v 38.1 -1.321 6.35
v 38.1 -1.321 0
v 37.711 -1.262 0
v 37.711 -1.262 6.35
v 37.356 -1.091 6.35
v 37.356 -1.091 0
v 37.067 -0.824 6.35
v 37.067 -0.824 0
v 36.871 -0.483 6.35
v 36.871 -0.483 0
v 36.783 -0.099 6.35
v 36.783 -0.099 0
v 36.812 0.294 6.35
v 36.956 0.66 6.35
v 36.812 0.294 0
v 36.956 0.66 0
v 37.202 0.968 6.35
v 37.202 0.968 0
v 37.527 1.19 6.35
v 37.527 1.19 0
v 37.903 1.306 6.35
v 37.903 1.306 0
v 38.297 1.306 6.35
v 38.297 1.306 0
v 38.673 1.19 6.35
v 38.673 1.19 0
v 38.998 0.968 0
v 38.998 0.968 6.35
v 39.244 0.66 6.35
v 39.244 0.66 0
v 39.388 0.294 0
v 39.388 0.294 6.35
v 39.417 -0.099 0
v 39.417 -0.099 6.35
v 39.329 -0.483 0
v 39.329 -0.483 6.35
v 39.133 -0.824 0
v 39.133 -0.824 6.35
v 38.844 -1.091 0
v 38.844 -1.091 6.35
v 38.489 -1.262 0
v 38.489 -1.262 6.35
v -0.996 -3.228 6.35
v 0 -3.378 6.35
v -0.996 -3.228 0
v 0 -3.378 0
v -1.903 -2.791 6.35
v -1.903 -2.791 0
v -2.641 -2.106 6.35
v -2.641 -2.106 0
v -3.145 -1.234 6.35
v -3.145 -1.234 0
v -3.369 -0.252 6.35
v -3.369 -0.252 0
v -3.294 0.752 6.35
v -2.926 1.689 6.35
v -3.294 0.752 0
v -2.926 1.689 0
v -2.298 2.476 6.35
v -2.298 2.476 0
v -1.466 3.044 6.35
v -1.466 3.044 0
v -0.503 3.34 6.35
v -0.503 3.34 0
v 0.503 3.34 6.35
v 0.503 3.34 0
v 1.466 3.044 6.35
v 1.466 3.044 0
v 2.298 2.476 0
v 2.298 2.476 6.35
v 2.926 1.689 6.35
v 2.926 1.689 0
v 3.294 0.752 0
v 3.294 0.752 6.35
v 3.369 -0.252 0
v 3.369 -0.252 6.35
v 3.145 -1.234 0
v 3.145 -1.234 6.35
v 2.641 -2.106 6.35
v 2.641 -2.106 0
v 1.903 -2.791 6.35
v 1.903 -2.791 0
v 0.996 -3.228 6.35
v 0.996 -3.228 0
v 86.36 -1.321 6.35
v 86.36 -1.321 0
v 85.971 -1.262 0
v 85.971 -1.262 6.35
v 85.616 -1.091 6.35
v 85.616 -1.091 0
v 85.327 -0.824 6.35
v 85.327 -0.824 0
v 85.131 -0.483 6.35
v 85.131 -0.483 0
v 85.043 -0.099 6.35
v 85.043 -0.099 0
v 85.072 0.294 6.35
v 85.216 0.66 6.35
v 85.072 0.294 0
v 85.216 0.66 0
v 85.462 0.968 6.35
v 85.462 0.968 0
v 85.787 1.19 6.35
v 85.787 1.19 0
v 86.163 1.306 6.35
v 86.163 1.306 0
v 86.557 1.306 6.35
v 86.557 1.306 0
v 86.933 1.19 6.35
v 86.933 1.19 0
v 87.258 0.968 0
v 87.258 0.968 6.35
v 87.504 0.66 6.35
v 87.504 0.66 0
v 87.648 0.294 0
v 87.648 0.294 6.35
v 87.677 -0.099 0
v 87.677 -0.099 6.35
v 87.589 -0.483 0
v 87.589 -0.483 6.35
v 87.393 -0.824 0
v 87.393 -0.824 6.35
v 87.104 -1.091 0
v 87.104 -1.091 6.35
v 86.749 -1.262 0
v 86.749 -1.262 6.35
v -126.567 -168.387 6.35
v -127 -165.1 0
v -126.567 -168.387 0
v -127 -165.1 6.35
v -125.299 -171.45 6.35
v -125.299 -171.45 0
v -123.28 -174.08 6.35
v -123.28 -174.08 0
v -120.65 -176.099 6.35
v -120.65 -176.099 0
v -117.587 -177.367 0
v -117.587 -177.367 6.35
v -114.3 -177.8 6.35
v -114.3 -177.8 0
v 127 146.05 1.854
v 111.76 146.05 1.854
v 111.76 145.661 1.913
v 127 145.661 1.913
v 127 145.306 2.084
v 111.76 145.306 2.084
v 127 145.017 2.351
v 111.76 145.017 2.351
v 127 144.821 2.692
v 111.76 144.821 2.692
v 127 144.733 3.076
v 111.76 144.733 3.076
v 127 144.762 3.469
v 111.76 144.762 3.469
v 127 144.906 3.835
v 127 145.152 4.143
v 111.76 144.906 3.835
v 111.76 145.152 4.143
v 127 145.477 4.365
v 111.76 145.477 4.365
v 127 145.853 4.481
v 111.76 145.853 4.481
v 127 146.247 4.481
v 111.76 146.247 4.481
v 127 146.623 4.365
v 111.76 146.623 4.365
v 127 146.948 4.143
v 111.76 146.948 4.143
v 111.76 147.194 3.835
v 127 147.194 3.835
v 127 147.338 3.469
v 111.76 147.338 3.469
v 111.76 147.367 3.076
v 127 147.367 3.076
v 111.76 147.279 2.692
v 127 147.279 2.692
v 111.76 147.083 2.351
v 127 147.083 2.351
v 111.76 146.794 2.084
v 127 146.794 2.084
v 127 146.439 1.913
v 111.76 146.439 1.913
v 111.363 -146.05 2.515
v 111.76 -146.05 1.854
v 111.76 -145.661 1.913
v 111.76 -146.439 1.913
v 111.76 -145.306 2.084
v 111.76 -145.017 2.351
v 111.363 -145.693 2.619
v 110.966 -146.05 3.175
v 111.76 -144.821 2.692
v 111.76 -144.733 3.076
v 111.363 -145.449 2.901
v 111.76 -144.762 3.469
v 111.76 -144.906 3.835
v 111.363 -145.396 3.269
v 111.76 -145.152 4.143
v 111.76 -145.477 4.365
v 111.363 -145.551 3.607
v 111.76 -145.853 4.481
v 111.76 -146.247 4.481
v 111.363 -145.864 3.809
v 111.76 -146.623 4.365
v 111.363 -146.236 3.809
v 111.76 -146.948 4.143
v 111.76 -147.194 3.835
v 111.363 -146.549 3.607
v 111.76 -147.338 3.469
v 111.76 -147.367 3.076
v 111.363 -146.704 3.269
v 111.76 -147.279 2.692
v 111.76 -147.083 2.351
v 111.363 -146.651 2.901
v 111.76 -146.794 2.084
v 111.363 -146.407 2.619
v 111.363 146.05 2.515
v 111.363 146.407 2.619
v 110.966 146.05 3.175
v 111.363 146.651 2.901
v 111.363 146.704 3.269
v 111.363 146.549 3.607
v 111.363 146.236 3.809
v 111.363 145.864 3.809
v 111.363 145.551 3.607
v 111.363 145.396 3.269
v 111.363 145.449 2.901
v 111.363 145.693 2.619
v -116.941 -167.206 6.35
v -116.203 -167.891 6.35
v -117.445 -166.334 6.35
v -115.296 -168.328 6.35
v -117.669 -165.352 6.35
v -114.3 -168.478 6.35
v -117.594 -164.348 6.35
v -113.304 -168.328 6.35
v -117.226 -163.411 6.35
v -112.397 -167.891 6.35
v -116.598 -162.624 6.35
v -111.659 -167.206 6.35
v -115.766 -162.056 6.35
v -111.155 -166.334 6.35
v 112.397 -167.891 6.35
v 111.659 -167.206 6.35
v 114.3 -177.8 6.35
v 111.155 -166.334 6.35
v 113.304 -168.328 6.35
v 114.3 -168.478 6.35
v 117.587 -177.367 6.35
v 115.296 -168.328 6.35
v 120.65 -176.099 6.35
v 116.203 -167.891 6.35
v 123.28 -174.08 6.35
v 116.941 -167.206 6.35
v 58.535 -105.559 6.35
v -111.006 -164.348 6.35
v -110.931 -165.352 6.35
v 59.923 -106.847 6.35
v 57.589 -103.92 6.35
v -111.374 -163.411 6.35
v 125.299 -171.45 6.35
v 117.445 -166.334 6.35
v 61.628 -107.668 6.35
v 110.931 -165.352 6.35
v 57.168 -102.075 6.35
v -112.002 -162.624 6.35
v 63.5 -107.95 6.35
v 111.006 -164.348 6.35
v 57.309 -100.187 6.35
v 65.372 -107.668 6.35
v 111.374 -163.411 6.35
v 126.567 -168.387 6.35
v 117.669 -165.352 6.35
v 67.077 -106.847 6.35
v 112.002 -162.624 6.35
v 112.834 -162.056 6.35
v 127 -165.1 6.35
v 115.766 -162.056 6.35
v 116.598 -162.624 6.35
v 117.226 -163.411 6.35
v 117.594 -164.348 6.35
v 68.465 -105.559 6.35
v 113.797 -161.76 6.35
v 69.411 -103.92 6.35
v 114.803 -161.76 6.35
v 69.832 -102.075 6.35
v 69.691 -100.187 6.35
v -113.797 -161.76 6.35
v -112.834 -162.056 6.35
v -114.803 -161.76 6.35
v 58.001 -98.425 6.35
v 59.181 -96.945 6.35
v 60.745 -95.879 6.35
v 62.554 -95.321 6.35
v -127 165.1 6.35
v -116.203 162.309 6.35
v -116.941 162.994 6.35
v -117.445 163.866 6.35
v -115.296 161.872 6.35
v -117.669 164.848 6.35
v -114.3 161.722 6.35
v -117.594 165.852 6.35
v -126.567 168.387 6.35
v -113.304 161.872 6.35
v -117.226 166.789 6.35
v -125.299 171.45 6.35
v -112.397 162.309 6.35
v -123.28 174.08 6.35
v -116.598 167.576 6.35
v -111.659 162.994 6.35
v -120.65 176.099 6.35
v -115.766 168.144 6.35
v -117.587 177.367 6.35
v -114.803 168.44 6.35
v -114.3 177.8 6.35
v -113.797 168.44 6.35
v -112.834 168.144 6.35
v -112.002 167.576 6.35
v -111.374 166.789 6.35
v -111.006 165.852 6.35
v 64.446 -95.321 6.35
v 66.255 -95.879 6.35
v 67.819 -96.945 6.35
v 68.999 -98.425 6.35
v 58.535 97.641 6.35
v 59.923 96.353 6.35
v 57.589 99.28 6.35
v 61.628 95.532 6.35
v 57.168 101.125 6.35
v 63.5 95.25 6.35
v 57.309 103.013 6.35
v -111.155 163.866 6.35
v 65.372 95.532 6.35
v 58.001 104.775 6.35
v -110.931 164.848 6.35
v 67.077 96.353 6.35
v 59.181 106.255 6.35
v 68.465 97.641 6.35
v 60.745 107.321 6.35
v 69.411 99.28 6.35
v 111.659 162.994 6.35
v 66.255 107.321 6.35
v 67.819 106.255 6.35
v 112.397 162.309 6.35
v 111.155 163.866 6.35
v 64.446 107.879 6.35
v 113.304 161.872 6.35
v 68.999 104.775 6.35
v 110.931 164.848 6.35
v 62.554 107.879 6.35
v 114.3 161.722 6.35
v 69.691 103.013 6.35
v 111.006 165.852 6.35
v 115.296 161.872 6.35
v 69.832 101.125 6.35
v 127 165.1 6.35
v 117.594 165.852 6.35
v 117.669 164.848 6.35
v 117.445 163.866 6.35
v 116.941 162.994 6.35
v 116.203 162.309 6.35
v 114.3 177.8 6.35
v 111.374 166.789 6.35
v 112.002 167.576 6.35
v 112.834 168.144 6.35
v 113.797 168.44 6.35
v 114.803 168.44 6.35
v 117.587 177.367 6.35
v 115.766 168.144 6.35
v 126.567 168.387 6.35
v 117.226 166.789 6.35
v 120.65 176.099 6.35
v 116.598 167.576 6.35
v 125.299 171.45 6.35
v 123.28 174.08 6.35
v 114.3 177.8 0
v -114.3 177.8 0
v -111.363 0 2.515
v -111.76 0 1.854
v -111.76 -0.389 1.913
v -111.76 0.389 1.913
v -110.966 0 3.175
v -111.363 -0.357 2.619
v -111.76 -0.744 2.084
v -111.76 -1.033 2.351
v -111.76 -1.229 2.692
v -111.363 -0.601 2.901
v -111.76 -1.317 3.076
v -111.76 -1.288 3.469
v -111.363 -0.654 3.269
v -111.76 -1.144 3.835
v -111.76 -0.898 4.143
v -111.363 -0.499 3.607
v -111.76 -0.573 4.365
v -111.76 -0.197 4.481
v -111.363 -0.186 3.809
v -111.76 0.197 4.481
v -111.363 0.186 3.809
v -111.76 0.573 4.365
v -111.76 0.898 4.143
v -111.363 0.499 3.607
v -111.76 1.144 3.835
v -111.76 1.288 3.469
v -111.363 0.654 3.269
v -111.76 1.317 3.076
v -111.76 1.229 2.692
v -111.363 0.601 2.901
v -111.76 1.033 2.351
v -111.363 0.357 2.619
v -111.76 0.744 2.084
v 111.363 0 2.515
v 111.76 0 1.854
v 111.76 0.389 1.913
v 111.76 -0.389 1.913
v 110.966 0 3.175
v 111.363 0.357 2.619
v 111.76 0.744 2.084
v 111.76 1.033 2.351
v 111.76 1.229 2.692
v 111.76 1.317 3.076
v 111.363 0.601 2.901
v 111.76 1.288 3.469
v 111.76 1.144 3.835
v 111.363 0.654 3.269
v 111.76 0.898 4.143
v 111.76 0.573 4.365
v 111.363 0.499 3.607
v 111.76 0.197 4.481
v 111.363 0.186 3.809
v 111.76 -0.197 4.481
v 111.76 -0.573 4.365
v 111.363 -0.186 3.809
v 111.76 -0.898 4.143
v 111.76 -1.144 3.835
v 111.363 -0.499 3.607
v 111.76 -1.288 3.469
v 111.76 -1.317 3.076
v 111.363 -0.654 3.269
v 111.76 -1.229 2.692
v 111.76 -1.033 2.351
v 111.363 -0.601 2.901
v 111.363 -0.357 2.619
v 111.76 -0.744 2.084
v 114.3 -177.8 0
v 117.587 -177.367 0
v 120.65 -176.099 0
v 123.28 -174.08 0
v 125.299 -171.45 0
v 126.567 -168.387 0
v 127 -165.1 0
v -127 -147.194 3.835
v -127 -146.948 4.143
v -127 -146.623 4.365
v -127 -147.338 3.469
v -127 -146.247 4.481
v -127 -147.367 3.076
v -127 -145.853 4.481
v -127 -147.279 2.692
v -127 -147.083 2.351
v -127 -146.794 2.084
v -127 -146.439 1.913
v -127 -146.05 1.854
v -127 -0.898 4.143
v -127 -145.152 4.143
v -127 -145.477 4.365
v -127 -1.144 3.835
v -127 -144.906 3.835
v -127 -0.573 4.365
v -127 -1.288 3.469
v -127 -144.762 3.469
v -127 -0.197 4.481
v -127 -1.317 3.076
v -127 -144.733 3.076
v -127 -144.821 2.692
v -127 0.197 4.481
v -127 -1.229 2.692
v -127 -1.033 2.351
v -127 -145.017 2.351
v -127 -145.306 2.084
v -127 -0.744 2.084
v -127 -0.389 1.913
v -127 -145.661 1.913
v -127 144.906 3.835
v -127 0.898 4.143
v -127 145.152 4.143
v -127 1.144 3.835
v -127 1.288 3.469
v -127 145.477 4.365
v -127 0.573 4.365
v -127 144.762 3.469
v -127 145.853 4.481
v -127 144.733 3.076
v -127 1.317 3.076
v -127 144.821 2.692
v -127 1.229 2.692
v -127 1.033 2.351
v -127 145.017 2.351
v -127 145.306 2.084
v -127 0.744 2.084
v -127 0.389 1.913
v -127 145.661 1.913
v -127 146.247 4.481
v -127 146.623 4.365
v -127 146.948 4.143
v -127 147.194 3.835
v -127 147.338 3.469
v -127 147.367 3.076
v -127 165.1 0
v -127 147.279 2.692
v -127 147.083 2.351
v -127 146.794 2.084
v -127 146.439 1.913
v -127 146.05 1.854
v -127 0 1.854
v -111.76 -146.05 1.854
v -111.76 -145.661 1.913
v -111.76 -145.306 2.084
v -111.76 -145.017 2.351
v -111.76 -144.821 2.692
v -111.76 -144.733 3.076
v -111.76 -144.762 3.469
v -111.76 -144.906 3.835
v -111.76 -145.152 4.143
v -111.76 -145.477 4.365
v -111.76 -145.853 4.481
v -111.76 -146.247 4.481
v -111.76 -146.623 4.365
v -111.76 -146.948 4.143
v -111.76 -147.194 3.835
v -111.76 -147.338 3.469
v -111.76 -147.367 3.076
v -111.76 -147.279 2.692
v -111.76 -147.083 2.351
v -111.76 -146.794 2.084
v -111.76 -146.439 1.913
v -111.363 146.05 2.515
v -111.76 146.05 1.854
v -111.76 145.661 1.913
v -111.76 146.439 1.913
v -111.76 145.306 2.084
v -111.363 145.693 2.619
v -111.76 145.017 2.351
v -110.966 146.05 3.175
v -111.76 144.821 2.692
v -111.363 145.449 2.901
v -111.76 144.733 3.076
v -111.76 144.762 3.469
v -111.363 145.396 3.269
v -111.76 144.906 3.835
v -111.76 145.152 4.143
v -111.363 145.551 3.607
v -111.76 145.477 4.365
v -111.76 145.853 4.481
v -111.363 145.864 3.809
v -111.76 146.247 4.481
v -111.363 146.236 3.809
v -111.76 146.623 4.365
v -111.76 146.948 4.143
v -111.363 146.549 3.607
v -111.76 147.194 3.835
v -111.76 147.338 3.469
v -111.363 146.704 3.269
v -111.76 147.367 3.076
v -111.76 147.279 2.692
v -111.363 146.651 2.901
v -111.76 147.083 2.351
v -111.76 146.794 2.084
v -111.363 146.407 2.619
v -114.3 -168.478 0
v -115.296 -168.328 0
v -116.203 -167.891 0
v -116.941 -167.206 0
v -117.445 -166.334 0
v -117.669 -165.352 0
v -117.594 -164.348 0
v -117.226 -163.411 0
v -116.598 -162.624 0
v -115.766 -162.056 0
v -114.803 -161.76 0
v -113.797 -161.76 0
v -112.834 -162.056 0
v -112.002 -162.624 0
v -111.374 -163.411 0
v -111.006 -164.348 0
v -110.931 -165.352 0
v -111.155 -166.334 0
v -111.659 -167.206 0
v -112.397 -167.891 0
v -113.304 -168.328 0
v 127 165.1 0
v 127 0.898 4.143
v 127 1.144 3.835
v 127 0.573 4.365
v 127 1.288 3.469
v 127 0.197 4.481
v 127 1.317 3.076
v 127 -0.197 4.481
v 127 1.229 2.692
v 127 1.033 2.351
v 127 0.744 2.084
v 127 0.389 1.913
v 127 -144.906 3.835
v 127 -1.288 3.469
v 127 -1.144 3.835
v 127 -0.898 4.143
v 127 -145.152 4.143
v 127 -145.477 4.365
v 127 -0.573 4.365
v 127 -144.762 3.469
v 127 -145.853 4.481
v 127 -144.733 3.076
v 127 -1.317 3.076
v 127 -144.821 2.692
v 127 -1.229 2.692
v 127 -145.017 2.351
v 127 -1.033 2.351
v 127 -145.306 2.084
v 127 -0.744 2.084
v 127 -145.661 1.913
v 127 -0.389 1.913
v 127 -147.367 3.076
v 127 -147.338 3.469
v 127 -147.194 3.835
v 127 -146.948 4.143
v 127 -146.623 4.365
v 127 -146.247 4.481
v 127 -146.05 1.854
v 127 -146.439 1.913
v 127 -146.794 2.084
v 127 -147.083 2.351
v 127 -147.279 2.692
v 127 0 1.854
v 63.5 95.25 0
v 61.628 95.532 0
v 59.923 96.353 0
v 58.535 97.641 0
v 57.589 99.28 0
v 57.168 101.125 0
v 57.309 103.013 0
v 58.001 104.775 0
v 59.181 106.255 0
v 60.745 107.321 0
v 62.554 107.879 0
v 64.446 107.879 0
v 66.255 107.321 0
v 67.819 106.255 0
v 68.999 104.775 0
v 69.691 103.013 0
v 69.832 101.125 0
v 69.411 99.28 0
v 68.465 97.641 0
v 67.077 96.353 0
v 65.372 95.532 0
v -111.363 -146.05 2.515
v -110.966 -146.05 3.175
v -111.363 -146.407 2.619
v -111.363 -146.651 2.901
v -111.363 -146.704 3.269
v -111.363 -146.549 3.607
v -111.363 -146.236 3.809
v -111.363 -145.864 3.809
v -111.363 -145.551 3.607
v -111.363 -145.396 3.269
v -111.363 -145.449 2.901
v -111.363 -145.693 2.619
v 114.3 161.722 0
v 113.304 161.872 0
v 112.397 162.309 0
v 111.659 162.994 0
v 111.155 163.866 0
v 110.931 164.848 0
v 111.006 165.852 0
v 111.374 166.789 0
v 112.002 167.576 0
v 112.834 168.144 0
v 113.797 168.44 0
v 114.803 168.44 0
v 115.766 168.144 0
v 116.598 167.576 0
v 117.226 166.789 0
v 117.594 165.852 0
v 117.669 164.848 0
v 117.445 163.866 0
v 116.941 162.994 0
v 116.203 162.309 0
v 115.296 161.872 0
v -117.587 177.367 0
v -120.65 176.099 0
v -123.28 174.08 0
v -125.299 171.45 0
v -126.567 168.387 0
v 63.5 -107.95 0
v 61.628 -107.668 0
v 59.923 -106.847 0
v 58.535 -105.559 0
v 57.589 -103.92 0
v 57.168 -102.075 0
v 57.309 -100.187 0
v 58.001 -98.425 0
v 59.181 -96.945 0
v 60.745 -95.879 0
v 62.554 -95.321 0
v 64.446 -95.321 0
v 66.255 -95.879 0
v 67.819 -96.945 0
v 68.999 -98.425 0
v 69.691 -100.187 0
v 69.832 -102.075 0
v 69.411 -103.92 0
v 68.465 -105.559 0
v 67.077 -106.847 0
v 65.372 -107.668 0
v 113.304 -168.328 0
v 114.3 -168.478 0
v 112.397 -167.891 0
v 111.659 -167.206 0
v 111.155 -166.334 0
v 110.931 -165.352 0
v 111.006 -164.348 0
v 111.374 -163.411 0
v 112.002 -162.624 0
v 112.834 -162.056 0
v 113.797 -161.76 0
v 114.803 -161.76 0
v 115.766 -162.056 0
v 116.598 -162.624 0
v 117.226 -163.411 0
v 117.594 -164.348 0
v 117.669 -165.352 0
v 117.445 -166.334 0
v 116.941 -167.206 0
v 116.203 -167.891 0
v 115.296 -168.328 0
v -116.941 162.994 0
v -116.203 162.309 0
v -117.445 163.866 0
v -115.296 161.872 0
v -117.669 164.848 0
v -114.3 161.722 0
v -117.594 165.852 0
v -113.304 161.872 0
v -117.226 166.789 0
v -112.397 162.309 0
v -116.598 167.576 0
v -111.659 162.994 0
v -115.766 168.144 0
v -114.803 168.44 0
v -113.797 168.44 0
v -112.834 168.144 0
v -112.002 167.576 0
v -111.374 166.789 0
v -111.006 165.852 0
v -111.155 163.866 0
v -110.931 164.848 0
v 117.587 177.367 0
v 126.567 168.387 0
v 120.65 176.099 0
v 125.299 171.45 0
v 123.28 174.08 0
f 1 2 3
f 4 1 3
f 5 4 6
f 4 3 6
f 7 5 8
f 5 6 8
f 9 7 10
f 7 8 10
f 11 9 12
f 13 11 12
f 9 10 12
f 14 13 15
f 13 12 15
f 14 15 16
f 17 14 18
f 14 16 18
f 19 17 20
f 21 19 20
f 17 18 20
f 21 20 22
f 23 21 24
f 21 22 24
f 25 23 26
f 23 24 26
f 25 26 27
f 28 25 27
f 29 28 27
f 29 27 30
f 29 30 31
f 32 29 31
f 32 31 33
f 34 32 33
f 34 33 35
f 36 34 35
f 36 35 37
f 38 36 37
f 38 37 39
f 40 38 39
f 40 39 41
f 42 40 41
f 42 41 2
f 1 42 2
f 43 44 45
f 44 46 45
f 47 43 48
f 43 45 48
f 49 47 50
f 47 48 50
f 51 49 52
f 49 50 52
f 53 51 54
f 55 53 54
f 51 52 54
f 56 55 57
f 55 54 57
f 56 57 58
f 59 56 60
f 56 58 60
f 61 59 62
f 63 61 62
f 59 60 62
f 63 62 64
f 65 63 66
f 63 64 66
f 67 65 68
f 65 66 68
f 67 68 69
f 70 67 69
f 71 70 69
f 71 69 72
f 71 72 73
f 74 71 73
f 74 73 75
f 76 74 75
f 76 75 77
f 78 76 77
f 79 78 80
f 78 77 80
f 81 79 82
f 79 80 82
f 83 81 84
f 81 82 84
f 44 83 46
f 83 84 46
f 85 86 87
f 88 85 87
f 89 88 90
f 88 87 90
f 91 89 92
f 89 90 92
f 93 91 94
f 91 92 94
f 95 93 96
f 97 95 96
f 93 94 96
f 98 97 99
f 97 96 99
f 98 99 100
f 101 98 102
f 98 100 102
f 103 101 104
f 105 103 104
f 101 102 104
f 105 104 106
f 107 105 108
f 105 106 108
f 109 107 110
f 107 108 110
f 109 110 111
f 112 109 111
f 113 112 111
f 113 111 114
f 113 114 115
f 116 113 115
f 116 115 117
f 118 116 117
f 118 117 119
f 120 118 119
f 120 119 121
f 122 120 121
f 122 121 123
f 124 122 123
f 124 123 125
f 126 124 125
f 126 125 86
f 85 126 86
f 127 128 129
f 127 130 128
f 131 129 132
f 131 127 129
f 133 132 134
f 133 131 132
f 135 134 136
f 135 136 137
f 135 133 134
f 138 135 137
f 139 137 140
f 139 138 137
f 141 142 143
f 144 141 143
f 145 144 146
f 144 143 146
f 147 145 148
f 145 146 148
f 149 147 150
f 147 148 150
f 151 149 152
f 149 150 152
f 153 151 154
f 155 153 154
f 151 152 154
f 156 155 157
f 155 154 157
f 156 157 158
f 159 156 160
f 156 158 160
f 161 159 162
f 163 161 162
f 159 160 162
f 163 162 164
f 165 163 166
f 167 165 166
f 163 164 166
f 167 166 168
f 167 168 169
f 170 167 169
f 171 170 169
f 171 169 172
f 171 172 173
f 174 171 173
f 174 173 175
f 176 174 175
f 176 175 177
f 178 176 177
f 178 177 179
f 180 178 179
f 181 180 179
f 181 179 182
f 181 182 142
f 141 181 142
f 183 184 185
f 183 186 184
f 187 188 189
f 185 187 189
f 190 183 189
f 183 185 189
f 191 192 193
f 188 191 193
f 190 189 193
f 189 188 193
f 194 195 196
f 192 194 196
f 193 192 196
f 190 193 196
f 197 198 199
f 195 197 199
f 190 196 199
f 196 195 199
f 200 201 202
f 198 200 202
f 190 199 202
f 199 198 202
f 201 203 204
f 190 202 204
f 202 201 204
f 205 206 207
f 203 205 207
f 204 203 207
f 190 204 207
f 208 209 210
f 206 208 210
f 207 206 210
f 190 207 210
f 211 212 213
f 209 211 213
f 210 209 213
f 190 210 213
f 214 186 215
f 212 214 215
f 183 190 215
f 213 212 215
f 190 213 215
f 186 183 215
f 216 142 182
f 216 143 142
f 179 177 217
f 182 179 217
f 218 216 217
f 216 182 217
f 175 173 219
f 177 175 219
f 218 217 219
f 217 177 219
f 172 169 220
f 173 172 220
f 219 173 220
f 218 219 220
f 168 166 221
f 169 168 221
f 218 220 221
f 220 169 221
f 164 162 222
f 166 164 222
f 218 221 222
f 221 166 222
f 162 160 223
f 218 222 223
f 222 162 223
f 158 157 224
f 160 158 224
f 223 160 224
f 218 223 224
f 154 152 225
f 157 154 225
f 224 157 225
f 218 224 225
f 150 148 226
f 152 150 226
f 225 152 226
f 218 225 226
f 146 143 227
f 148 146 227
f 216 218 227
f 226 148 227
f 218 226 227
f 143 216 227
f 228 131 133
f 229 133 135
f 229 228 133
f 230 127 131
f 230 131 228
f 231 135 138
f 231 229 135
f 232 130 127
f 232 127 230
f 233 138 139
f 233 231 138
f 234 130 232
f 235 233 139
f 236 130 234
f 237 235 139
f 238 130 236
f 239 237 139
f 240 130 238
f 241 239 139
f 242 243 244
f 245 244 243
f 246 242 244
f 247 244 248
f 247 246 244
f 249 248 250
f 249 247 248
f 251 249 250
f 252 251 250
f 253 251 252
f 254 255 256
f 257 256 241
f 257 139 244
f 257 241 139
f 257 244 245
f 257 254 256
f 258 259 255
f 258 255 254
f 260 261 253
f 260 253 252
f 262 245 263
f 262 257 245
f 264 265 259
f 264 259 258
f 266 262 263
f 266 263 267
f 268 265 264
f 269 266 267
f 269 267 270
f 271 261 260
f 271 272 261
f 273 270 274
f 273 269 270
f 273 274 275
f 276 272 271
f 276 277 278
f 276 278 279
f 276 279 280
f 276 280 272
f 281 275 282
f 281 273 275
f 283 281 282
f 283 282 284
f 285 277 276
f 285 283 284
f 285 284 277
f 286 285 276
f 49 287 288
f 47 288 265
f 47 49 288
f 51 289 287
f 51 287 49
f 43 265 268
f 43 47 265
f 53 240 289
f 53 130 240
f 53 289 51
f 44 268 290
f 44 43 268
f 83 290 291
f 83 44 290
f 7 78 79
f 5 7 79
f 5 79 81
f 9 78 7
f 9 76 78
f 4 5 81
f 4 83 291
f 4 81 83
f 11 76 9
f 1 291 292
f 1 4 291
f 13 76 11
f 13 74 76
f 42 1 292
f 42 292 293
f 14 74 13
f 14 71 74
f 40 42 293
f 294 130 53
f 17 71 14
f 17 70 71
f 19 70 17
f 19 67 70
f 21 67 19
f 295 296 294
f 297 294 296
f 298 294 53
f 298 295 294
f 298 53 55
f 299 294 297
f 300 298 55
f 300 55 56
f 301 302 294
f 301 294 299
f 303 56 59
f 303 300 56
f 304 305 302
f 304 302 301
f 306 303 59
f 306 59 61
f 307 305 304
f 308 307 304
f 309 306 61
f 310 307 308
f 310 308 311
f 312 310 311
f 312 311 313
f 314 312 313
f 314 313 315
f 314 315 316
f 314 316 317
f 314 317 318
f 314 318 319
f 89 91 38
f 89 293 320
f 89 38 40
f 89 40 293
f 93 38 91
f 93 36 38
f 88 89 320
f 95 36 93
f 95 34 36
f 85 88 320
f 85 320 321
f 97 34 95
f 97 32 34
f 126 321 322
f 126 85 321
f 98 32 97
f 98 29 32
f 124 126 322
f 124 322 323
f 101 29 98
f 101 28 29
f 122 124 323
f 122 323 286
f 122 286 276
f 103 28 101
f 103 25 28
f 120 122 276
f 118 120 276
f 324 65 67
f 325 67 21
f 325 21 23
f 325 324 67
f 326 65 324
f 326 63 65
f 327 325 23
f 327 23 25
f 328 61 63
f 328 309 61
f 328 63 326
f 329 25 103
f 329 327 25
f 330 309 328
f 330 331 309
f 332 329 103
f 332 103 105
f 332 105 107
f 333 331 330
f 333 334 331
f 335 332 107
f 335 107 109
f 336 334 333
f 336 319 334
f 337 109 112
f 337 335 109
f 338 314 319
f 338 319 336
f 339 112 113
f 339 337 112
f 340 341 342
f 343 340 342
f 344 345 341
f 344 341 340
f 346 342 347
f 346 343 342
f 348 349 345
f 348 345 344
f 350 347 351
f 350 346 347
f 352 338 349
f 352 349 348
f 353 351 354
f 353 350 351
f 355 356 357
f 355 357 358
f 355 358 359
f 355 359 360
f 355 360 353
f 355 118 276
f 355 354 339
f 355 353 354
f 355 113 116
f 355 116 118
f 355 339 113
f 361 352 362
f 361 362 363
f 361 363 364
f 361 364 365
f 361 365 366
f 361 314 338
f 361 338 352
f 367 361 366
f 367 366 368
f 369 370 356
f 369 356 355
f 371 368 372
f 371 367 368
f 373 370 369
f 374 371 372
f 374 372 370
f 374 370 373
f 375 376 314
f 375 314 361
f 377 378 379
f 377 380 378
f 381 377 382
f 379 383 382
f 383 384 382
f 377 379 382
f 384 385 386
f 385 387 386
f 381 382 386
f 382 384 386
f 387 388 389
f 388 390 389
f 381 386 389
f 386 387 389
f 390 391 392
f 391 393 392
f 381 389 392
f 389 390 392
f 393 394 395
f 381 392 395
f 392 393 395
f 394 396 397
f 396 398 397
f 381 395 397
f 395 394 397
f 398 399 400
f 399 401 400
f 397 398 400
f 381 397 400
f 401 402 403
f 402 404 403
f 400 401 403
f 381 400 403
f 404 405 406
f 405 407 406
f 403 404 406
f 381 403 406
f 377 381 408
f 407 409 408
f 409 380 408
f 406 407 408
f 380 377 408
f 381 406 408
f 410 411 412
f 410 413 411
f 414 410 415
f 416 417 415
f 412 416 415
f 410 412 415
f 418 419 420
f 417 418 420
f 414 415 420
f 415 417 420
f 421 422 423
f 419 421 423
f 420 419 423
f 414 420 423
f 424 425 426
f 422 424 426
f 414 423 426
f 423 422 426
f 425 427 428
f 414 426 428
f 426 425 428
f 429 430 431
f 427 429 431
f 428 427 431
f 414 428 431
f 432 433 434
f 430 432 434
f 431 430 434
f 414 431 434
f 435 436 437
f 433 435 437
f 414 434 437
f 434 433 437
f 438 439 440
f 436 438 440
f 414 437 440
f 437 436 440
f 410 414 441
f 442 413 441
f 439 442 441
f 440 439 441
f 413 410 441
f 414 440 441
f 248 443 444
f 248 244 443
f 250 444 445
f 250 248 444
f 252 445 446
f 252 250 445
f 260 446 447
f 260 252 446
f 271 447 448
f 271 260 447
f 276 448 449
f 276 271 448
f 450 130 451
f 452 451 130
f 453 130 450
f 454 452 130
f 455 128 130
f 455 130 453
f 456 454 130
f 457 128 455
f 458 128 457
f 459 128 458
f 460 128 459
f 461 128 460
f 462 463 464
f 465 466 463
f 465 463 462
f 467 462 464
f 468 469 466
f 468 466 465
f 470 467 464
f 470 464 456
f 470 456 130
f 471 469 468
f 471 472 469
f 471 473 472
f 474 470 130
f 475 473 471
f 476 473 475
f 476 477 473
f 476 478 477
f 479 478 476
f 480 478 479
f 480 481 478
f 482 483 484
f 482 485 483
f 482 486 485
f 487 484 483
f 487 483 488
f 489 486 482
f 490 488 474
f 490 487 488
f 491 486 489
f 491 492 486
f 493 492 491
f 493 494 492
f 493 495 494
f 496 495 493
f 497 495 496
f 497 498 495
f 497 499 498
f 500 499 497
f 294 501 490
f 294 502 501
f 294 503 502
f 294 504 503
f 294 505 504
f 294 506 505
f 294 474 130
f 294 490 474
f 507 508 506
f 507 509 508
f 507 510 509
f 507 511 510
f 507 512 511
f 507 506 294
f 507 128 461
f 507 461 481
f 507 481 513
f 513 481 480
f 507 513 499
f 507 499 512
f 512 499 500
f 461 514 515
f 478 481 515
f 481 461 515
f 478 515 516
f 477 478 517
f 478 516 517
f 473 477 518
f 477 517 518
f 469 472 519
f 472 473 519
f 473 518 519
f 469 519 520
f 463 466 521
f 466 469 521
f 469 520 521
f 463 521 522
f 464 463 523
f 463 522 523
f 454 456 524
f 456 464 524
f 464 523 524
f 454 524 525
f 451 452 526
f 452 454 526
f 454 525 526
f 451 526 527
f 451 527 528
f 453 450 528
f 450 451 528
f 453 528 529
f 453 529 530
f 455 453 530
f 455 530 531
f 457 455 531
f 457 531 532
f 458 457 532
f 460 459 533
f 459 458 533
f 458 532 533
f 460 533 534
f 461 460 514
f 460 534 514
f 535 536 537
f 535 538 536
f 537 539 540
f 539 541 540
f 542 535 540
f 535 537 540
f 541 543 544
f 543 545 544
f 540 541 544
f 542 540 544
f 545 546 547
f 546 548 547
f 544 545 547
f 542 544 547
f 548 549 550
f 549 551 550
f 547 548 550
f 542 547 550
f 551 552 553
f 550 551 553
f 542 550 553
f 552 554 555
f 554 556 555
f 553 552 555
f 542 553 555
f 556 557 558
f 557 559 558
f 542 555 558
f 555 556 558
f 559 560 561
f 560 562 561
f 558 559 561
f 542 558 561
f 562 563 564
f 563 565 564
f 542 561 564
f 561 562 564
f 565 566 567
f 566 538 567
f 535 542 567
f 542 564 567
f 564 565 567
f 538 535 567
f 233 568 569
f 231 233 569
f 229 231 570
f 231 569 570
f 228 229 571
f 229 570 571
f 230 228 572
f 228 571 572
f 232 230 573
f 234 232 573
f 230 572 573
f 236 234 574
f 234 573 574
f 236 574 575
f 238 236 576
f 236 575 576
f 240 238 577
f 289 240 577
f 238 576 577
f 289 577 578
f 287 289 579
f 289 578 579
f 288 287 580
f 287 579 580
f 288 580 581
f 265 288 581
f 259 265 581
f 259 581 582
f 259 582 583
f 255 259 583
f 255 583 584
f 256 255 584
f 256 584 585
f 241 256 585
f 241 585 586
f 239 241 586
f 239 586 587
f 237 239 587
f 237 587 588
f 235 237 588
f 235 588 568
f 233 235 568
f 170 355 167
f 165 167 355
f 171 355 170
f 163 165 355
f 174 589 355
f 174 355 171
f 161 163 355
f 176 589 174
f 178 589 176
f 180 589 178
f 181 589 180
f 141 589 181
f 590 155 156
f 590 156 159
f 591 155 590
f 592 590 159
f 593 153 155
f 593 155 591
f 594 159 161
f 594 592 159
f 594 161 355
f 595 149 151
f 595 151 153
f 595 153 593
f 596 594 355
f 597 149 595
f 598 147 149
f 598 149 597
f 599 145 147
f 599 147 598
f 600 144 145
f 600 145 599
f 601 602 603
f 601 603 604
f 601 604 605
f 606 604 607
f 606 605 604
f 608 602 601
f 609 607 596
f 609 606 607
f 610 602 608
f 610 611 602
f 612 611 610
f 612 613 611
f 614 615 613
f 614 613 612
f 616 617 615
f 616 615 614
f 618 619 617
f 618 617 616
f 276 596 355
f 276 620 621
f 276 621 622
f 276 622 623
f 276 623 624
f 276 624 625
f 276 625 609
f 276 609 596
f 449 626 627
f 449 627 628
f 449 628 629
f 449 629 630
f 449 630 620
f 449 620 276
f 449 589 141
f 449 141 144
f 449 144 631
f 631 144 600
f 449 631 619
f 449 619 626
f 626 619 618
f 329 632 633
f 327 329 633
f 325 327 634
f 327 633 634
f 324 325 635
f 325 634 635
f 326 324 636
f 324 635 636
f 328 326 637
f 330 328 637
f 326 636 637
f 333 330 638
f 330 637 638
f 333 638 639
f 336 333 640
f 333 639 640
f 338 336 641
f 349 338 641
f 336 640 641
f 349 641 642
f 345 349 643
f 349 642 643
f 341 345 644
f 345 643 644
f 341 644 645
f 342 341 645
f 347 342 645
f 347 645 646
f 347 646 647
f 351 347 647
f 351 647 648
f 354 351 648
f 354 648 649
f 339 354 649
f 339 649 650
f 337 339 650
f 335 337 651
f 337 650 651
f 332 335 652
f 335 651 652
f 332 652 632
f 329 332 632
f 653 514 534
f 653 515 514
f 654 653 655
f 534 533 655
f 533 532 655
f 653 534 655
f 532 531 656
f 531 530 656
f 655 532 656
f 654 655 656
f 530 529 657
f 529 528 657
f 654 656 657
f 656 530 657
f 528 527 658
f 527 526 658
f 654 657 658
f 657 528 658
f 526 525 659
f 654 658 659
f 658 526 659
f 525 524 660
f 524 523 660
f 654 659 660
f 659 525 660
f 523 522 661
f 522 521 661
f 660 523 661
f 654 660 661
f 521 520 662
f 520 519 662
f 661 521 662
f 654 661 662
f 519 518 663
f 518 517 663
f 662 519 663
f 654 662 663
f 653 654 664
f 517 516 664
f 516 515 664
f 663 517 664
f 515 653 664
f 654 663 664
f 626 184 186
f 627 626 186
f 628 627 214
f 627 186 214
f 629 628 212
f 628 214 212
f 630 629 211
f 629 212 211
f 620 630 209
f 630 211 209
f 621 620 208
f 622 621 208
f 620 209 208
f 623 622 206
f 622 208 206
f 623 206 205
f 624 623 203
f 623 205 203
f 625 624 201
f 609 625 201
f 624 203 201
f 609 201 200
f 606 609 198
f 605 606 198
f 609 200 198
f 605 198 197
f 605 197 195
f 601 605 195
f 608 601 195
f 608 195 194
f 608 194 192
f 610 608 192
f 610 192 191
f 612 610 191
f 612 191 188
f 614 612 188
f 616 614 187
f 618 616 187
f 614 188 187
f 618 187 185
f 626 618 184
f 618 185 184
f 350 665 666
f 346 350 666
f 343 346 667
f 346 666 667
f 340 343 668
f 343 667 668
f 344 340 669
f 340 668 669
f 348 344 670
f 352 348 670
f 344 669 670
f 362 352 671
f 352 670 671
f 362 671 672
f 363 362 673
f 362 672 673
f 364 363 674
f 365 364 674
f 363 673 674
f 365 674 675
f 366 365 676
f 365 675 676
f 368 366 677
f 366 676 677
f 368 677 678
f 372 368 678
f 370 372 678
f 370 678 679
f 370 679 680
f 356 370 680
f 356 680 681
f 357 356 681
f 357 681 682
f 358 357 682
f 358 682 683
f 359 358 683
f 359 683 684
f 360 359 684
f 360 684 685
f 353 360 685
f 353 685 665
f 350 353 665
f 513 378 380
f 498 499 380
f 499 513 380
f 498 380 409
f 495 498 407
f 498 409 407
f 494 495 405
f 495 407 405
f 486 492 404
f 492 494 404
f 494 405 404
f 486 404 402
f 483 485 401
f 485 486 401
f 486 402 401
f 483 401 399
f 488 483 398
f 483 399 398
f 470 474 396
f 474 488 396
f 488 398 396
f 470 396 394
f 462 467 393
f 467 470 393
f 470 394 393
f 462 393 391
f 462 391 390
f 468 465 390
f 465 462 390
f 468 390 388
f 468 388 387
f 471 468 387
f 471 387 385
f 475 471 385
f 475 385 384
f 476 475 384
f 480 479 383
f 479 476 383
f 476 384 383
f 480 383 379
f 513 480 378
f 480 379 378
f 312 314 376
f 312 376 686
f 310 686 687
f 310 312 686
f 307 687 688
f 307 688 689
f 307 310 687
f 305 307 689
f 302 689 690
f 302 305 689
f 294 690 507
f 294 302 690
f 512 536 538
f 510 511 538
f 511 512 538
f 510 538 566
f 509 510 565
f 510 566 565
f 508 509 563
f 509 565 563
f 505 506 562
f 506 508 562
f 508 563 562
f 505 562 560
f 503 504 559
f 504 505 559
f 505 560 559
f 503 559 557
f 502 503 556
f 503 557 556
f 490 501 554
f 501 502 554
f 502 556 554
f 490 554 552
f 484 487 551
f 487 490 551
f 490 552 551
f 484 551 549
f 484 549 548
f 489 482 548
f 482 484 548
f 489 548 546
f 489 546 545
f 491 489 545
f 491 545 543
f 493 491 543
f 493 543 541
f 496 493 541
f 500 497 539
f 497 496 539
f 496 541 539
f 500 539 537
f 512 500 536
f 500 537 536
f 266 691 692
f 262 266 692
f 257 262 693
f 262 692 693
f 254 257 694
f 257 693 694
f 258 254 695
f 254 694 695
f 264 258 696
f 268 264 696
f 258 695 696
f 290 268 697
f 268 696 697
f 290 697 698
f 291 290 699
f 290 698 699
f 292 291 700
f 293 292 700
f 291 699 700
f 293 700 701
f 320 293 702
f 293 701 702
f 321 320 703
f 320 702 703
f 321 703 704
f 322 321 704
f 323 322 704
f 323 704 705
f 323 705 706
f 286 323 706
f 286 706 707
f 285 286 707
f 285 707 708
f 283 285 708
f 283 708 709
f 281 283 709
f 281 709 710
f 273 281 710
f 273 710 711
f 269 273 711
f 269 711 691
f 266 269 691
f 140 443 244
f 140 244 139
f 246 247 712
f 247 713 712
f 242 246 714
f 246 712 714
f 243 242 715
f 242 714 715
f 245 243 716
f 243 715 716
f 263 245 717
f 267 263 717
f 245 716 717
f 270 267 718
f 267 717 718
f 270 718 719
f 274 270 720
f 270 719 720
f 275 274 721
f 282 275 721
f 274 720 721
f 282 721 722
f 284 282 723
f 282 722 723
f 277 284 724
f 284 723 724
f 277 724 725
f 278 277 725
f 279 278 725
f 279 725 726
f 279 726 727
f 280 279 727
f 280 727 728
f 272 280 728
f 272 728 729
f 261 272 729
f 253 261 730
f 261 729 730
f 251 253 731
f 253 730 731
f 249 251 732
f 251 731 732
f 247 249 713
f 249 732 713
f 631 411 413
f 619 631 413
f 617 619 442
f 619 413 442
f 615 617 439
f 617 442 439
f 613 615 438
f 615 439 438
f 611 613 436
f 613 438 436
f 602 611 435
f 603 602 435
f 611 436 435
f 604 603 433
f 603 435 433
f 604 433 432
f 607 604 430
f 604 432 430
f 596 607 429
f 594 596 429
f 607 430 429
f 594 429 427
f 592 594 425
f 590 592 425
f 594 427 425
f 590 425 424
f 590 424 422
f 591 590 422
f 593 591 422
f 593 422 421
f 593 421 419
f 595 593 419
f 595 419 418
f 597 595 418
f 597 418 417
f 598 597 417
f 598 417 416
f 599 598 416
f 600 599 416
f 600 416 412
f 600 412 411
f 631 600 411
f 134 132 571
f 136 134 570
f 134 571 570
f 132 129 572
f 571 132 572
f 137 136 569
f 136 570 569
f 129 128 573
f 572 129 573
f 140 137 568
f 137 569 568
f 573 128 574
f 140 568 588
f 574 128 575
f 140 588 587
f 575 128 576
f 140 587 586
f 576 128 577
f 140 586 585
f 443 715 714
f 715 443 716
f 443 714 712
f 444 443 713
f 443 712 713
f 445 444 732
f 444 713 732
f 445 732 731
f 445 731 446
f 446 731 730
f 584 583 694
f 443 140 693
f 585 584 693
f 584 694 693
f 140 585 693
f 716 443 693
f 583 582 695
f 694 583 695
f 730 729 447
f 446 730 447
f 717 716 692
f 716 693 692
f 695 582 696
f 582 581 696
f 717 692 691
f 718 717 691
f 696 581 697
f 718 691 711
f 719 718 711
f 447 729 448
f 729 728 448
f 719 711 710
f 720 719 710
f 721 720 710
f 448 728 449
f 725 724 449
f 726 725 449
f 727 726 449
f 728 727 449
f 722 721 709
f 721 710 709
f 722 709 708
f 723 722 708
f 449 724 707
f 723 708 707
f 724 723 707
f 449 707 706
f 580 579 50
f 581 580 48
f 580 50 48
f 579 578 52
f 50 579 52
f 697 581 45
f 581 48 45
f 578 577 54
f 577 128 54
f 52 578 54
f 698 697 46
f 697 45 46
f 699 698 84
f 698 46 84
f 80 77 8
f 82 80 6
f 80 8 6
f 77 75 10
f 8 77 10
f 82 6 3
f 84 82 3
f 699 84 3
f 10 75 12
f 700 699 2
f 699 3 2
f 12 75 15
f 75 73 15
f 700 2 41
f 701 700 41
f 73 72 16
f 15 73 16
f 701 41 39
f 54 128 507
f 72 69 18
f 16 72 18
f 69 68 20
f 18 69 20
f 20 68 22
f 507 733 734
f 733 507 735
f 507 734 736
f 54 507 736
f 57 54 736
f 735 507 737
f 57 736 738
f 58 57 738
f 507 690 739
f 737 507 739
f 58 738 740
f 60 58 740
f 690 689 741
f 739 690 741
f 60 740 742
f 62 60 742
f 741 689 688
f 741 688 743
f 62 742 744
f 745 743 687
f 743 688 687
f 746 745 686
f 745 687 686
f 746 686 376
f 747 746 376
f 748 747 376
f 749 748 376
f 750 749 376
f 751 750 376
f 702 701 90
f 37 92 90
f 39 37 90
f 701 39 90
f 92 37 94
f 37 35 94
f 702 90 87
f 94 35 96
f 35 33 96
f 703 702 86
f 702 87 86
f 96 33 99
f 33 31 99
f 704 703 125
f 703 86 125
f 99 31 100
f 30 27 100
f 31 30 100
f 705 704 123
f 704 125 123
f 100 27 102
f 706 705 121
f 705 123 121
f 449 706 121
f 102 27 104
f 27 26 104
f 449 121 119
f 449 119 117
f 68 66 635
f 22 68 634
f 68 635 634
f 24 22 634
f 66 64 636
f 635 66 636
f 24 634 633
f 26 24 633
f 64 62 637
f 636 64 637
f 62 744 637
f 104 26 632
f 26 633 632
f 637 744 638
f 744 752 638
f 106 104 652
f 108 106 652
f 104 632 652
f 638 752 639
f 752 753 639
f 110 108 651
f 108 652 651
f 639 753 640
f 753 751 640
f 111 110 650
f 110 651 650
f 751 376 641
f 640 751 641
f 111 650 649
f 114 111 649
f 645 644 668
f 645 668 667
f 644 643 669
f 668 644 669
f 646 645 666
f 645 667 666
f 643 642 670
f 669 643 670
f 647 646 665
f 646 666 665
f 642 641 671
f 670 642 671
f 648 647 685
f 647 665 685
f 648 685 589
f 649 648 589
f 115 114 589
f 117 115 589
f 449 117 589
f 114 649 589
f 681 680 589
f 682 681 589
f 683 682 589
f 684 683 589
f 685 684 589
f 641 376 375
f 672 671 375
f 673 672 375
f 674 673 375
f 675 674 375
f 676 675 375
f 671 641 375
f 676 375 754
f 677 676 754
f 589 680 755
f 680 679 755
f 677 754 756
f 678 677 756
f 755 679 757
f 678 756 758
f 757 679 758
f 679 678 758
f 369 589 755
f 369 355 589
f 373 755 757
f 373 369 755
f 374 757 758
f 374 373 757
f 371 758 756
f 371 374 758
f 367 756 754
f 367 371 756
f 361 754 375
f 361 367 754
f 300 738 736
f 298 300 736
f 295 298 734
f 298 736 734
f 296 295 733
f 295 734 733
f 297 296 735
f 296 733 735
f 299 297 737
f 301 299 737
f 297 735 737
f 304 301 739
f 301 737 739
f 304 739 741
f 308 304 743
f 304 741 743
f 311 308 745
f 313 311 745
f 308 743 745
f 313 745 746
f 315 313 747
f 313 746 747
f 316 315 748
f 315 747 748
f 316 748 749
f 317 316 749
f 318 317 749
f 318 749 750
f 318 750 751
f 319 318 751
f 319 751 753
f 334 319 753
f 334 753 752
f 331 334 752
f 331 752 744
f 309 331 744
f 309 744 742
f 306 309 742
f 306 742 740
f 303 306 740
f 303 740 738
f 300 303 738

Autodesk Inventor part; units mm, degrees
ref_plane "YZ Plane" through (0, 0, 0) normal (1, 0, 0) x (0, 1, 0)
ref_plane "XZ Plane" through (0, 0, 0) normal (0, 1, 0) x (-1, 0, 0)
ref_plane "XY Plane" through (0, 0, 0) normal (0, 0, 1) x (1, 0, 0)
sketch "Sketch1" plane through (0, 0, 0) normal (0, 0, 1) x (1, 0, 0)
  line L0 (-127, 177.8) -> (127, 177.8)
  line L1 (127, 177.8) -> (127, -177.8)
  line L2 (127, -177.8) -> (-127, -177.8)
  line L3 (-127, -177.8) -> (-127, 177.8)
  point P0 (0, 0)
  dimension "d0" = 254
  dimension "d1" = 127
  dimension "d2" = 355.6
  dimension "d3" = 177.8
extrude "Extrusion1" add sketch "Sketch1" along normal blind 6.35
sketch "Sketch2" plane through (0, 0, 6.35) normal (0, 0, 1) x (1, 0, 0)
  line L0 (-114.3, 165.1) -> (114.3, 165.1) construction
  line L1 (114.3, 165.1) -> (114.3, -165.1) construction
  line L2 (114.3, -165.1) -> (-114.3, -165.1) construction
  line L3 (-114.3, -165.1) -> (-114.3, 165.1) construction
  line L4 (-127, 177.8) -> (127, 177.8) construction
  line L5 (127, -177.8) -> (-127, -177.8) construction
  line L6 (-127, -177.8) -> (-127, 177.8) construction
  line L7 (127, 177.8) -> (127, -177.8) construction
  point P0 (0, 0)
  point P1 (0, 0)
  dimension "d6" = 12.7
  dimension "d7" = 12.7
  dimension "d8" = 12.7
  dimension "d9" = 12.7
hole "Hole1" at (-114.3, 165.1, 6.35) at (114.3, 165.1, 6.35) at (114.3, -165.1, 6.35) at (-114.3, -165.1, 6.35) at (0, 0, 6.35) direction (0, 0, -1) diameter 6.7564 end through all clearance for "Flat Head Machine Screw (82)" size "1/4" standard "Ansi Unified Screw Threads"
fillet "Fillet1" radius 12.7 4 edges at (127, -177.8, 3.175) (-127, -177.8, 3.175) (127, 177.8, 3.175) (-127, 177.8, 3.175)
sketch "Sketch9" plane through (127, -165.1, 0) normal (1, 0, 0) x (0, 0, -1)
  line L0 (-6.35, 330.2) -> (0, 330.2) projected
  line L1 (-6.35, 330.2) -> (-6.35, 0) projected
  line L2 (0, 0) -> (-6.35, 0) projected
  line L3 (0, 330.2) -> (0, 0) projected
  line L4 (-3.175, 330.2) -> (-3.175, 0) construction
  line L5 (0, 165.1) -> (-6.35, 165.1) construction
  point P0 (-3.175, 165.1)
  point P1 (-3.175, 311.15)
  point P2 (-3.175, 19.05)
  dimension "d68" = 146.05
hole "Hole6" at (127, 0, 3.175) at (127, 146.05, 3.175) at (127, -146.05, 3.175) direction (-1, 0, 0) diameter 2.6416 depth 15.24 tip angle 118 thread size "6-32 UNC" class "2B" standard "ANSI Unified Screw Threads"
mirror "Mirror2" about plane through (0, 0, 0) normal (1, 0, 0) of "Hole6"
sketch "Sketch10" plane through (0, 0, 6.35) normal (0, 0, 1) x (1, 0, 0)
  line L0 (-177.8, 0) -> (177.8, 0) construction
  point P0 (0, 0)
  point P1 (86.36, 0)
  point P2 (38.1, 0)
  dimension "d76" = 48.26
  dimension "d85" = 38.1
hole "Hole7" at (86.36, 0, 6.35) at (38.1, 0, 6.35) direction (0, 0, -1) diameter 2.6416 end through all thread size "6-32 UNC" class "2B" standard "ANSI Unified Screw Threads"
sketch "Sketch11" plane through (0, 0, 6.35) normal (0, 0, 1) x (1, 0, 0)
  circle A0 centre (38.1, 0) radius 1.3208 projected
  circle A1 centre (86.36, 0) radius 1.3208 projected
  arc A2 (-114.3, 177.8) -> (-127, 165.1) centre (-114.3, 165.1) ccw projected
  line L0 (-127, -165.1) -> (-127, 165.1) projected
  arc A3 (-127, -165.1) -> (-114.3, -177.8) centre (-114.3, -165.1) ccw projected
  line L1 (114.3, -177.8) -> (-114.3, -177.8) projected
  arc A4 (114.3, -177.8) -> (127, -165.1) centre (114.3, -165.1) ccw projected
  line L2 (127, 165.1) -> (127, -165.1) projected
  arc A5 (127, 165.1) -> (114.3, 177.8) centre (114.3, 165.1) ccw projected
  line L3 (-114.3, 177.8) -> (114.3, 177.8) projected
  circle A6 centre (0, 0) radius 3.3782 projected
  circle A7 centre (-114.3, -165.1) radius 3.3782 projected
  circle A8 centre (114.3, -165.1) radius 3.3782 projected
  circle A9 centre (114.3, 165.1) radius 3.3782 projected
  circle A10 centre (-114.3, 165.1) radius 3.3782 projected
  line L4 (63.5, 177.8) -> (63.5, -177.8) construction
  line L5 (-127, 0) -> (127, 0) construction
  point P0 (63.5, 101.6)
  point P1 (63.5, -101.6)
  dimension "d86" = 63.5
  dimension "d87" = 101.6
hole "Hole8" at (63.5, 101.6, 6.35) at (63.5, -101.6, 6.35) direction (0, 0, -1) diameter 12.7 end through all
equation "\"d1\" = 0.5 * d0"
equation "\"d3\" = 0.5 * d2"
properties part number "J001398" material "ALUMINUM, 6061-T651"
